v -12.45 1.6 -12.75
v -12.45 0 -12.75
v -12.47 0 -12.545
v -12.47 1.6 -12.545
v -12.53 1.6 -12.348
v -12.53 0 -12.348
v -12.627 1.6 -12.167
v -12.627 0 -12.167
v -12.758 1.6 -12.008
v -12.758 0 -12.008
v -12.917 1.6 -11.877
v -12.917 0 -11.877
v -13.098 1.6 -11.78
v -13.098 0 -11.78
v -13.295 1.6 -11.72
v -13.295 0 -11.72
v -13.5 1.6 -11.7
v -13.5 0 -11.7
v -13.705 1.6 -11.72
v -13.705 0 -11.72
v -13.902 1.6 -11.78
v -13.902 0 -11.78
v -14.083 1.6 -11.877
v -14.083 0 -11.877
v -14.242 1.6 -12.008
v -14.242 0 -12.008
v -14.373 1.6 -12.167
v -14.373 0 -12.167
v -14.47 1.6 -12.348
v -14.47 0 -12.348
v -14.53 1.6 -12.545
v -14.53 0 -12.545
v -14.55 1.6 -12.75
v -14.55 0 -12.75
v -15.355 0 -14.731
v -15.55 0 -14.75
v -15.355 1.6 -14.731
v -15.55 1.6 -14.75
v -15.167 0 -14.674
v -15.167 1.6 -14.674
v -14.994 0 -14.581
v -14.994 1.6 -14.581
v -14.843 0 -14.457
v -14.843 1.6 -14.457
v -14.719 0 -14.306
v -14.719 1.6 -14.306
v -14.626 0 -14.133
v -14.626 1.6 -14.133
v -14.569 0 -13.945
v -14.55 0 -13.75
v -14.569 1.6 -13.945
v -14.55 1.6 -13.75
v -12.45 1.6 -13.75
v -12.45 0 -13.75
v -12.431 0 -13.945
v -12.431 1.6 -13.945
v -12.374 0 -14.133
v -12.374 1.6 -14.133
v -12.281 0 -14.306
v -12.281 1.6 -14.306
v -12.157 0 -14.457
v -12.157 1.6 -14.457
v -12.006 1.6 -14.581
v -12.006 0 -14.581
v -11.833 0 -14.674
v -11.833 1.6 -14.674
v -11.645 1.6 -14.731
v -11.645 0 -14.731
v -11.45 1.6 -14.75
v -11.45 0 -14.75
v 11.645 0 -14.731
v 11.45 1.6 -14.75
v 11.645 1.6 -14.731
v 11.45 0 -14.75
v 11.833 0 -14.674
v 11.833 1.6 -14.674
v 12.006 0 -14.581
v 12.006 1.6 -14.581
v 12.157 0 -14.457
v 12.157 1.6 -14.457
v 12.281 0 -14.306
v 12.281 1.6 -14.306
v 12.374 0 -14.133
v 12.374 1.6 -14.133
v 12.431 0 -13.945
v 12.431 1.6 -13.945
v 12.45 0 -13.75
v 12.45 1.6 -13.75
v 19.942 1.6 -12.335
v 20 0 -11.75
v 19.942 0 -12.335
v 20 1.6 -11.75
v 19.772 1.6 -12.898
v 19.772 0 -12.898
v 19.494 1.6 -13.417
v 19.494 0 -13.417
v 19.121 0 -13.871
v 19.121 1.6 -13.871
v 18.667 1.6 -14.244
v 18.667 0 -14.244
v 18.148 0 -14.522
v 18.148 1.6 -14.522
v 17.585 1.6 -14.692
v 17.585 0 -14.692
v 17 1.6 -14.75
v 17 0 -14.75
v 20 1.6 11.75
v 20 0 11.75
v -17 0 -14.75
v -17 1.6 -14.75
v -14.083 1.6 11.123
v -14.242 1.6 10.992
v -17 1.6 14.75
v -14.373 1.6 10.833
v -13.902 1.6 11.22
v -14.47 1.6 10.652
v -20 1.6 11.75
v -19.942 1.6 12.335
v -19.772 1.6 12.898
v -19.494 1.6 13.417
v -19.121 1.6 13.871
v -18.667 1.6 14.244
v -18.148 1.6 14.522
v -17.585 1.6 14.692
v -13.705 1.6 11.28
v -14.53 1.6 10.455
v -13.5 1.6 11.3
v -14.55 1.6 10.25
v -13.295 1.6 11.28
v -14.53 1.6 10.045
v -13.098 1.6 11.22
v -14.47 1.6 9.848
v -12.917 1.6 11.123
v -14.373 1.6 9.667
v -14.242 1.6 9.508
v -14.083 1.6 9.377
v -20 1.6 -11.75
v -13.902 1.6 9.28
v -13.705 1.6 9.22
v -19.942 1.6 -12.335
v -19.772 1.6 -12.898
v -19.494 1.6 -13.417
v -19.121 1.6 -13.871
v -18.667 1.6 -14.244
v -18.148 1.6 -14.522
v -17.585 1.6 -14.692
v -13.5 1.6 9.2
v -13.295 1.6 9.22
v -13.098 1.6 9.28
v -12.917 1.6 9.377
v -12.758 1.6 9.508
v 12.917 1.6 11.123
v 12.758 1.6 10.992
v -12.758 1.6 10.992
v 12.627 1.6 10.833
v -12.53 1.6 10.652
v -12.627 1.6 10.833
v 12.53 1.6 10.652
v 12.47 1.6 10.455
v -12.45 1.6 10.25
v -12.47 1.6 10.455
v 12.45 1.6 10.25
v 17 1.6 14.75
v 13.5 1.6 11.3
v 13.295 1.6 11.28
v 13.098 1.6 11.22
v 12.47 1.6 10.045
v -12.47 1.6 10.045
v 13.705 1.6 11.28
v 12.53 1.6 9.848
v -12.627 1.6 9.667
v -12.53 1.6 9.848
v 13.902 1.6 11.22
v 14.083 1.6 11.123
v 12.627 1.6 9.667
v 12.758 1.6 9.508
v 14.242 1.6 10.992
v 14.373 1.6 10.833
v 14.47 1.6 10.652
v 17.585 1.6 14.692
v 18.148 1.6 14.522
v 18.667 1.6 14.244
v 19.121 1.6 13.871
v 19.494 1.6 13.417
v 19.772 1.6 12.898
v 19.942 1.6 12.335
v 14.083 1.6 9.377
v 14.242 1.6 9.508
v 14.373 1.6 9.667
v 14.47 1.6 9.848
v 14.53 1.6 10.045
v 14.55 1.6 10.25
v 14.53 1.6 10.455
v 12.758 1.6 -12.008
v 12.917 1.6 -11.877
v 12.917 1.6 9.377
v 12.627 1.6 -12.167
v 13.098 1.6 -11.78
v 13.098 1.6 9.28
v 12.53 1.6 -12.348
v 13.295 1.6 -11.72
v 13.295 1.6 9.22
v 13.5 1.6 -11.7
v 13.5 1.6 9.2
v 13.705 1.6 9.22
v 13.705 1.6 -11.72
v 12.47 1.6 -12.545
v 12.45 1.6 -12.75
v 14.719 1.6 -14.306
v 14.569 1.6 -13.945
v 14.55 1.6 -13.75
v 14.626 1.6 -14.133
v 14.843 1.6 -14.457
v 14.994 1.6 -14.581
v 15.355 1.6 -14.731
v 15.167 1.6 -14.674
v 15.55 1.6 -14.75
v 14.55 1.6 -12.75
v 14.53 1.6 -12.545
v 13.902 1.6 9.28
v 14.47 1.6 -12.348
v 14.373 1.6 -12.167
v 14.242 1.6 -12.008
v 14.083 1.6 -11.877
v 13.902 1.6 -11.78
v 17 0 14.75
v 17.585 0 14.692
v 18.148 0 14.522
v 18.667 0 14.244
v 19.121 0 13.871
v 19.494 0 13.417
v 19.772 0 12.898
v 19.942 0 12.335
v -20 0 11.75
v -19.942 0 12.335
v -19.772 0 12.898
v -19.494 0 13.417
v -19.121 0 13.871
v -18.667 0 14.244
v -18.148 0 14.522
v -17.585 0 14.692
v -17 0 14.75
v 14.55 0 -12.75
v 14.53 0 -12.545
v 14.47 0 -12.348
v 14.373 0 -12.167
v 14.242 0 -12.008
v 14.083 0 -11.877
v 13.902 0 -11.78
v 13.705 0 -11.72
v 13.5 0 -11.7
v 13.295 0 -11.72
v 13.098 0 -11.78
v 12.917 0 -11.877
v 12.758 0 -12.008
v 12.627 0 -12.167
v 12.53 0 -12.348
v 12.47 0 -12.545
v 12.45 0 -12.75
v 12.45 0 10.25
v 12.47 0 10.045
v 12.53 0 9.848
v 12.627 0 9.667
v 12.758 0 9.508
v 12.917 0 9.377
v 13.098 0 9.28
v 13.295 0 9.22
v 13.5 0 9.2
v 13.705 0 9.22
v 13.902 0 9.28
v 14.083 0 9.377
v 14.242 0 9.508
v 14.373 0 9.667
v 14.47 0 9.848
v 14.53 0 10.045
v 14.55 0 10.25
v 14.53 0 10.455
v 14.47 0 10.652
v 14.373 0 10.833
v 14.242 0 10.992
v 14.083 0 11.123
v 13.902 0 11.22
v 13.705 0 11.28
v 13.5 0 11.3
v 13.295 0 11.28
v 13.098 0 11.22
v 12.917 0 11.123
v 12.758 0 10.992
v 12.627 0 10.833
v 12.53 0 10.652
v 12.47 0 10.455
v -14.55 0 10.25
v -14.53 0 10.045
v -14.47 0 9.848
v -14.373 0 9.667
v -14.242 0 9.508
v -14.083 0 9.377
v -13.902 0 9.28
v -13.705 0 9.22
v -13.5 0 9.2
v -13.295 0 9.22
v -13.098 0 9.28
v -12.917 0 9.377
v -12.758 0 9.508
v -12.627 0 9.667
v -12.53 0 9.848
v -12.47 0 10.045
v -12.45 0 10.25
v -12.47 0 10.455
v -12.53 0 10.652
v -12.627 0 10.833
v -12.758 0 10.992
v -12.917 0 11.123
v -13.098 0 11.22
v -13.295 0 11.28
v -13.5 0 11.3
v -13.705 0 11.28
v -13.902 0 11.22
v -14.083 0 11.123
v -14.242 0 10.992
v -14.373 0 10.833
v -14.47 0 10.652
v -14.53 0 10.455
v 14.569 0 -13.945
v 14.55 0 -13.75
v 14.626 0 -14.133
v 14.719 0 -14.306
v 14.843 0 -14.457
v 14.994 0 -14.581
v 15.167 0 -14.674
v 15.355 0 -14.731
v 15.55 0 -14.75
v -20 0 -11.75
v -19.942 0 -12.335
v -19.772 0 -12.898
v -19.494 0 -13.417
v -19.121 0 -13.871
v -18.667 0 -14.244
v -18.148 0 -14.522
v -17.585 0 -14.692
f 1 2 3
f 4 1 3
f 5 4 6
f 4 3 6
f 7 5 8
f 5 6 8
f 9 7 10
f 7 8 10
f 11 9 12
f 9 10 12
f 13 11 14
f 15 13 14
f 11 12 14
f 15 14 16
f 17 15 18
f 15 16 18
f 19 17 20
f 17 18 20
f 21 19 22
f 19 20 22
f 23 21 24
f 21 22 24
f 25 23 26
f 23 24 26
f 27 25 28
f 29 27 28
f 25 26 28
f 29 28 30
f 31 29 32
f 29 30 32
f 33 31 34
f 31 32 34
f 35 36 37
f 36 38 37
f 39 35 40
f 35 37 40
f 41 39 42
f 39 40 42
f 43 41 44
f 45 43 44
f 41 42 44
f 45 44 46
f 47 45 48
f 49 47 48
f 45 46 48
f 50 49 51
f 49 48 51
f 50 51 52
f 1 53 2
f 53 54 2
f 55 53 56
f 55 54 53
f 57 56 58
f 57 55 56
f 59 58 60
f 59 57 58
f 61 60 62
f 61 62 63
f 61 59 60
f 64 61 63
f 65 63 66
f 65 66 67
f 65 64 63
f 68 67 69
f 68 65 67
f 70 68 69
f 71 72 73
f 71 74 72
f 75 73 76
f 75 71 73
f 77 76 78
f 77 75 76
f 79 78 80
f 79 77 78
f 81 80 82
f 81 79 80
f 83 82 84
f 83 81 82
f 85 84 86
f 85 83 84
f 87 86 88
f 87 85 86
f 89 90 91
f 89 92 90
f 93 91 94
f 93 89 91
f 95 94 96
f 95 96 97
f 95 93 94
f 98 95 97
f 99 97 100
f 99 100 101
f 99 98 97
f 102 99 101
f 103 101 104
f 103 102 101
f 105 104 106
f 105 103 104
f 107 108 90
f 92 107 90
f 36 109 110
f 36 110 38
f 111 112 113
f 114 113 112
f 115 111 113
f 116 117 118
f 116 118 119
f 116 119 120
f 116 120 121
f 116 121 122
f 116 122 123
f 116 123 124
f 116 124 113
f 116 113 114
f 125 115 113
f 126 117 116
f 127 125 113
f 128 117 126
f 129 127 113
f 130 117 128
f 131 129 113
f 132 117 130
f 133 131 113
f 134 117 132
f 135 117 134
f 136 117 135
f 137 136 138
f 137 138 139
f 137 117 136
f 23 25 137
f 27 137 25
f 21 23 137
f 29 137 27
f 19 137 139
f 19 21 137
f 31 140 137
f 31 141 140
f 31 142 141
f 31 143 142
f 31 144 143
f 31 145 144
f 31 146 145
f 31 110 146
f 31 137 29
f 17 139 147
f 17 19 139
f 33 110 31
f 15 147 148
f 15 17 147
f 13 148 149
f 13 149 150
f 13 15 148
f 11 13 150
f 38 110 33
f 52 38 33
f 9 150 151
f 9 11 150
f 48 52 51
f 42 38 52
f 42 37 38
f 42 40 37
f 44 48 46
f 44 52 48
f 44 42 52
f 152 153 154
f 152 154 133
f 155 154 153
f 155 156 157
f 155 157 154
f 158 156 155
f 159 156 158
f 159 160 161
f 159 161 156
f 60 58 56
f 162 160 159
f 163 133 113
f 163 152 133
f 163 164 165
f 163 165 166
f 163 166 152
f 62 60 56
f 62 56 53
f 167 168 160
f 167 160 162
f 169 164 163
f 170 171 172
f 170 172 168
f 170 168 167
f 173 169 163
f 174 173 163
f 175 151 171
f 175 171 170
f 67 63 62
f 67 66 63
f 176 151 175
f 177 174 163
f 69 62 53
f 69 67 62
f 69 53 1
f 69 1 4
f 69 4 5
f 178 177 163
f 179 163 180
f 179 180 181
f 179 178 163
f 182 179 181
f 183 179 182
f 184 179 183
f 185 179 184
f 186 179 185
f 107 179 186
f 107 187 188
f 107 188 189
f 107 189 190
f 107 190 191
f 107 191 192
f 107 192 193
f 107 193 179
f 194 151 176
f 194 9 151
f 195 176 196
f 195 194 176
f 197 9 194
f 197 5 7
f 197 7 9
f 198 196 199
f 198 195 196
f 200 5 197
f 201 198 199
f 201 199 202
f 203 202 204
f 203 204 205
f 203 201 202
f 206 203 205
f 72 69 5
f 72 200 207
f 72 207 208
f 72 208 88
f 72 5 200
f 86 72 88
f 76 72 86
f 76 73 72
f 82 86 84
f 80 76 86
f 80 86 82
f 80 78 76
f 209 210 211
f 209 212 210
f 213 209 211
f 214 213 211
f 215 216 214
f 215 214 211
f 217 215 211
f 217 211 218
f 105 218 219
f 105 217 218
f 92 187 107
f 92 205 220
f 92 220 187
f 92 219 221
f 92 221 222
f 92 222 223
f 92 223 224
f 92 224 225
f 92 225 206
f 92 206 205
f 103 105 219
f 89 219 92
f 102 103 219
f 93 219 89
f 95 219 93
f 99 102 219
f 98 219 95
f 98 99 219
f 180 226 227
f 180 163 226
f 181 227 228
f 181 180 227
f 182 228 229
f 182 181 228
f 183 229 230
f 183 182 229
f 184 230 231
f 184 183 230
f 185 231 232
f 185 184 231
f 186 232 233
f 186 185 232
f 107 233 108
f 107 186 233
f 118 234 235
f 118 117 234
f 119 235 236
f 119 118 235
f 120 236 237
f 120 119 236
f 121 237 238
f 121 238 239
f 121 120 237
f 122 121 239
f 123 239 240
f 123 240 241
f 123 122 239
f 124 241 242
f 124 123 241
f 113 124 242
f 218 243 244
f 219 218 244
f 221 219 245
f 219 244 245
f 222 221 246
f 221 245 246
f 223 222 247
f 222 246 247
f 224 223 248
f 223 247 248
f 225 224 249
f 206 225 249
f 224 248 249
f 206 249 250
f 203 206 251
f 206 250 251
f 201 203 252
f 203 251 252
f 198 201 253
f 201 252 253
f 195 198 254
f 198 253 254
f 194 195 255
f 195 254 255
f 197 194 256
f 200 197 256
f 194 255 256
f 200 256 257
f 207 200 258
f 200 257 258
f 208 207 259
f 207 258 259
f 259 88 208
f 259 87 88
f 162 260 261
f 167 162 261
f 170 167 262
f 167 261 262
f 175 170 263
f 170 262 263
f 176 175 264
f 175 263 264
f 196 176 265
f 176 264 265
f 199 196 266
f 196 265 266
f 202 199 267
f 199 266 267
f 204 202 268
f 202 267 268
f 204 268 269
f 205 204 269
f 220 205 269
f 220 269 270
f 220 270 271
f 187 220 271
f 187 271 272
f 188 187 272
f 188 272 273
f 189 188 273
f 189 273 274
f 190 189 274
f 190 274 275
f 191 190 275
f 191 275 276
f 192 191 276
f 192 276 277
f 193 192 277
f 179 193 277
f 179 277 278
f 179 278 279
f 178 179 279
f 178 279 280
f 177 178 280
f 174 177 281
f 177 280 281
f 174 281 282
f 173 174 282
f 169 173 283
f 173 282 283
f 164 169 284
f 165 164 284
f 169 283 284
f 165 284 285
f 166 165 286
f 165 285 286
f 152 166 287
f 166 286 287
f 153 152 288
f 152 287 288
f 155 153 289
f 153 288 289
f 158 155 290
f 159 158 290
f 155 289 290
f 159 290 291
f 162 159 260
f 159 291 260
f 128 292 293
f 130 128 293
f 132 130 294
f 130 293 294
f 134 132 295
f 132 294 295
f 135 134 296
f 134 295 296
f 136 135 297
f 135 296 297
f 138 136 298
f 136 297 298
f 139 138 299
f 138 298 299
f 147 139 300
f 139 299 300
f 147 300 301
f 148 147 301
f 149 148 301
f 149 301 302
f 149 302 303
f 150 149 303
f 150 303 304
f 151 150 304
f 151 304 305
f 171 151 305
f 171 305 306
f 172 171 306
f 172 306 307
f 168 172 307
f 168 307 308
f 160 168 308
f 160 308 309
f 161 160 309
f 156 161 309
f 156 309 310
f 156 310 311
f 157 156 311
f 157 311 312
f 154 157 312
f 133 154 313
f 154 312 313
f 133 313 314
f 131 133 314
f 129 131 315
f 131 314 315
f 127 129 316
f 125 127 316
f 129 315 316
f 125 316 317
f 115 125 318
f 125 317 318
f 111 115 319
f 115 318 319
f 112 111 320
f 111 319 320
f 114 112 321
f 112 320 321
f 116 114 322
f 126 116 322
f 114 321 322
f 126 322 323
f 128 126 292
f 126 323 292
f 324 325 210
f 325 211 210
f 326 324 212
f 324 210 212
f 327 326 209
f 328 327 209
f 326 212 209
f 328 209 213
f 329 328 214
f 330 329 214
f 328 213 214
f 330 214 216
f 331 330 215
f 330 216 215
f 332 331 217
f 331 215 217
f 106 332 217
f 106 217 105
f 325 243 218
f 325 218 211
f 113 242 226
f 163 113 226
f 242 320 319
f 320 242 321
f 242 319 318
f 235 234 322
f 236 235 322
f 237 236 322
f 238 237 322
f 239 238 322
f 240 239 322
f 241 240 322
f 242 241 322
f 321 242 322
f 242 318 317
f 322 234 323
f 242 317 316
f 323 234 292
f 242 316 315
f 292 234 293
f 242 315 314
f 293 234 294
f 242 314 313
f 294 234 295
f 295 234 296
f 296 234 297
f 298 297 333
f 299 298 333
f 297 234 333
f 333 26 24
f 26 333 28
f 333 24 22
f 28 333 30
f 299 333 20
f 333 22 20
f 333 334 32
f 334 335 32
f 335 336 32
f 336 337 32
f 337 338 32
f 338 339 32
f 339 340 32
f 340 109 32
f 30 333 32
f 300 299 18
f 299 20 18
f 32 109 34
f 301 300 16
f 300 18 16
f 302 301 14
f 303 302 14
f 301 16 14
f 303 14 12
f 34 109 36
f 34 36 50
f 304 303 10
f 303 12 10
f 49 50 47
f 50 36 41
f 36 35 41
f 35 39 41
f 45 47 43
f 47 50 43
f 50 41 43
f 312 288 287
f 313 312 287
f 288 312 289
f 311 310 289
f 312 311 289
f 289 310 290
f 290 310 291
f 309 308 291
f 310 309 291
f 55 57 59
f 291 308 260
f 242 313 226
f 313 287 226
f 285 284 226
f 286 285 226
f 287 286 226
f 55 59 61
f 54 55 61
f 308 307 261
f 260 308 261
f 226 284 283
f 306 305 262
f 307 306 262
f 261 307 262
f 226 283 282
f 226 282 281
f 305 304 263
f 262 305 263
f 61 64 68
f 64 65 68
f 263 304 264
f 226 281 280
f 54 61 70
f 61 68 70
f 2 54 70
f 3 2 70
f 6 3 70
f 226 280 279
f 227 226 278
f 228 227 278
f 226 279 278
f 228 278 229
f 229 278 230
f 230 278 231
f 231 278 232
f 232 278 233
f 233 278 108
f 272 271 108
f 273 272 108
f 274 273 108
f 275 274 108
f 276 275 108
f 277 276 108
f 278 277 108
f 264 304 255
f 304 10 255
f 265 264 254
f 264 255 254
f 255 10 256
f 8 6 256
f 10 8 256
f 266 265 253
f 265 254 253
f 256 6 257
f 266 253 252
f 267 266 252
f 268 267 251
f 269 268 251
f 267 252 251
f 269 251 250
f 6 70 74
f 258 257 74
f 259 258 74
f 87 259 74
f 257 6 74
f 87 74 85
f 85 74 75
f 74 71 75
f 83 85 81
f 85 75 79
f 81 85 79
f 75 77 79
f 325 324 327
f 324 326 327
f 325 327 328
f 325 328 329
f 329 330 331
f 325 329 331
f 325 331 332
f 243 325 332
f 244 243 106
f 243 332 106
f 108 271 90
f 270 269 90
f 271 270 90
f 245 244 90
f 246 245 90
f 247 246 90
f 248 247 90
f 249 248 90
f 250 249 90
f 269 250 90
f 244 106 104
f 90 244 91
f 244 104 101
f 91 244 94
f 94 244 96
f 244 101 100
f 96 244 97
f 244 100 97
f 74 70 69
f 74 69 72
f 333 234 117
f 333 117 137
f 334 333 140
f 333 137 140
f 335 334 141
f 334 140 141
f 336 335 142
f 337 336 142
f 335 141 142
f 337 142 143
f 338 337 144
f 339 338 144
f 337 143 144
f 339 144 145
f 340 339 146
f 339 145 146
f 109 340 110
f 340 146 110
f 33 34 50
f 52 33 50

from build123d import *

# Parameters (mm, degrees)
SKETCH1_W                = 40
SKETCH1_H                = 29.5
BOSS_EXTRUDE1_DEPTH      = 1.6
FILLET1_R                = 3
M2_CLEARANCE_HOLE3_D     = 2.1
M2_CLEARANCE_HOLE3_DEPTH = 5.2
M2_CLEARANCE_HOLE3_TIP   = 0.63090365
CUT_EXTRUDE2_DEPTH       = 25.902258934
CUT_EXTRUDE2_DEPTH_BACK  = 25.902258934
FILLET3_R                = 1


with BuildPart() as part:
    # Sketch1 → Boss-Extrude1 (new body)
    with BuildSketch(Plane(origin=(0, 0, 0), x_dir=(1, 0, 0), z_dir=(0, 1, 0))):
        Rectangle(SKETCH1_W, SKETCH1_H)
    extrude(amount=BOSS_EXTRUDE1_DEPTH)

    # Fillet1
    fillet1_edges = [part.edges().sort_by_distance(p)[0] for p in [
        (-20, 0.8, -14.75),
        (20, 0.8, -14.75),
        (20, 0.8, 14.75),
        (-20, 0.8, 14.75),
    ]]
    fillet(fillet1_edges, radius=FILLET1_R)

    # M2 Clearance Hole3
    with Locations(Plane(origin=(0, 1.6, 0), x_dir=(1, 0, 0), z_dir=(0, 1, 0))):
        with Locations((-13.5, 12.75), (13.5, 12.75), (13.5, -10.25), (-13.5, -10.25)):
            Hole(M2_CLEARANCE_HOLE3_D / 2, depth=M2_CLEARANCE_HOLE3_DEPTH)
            with Locations((0, 0, -(M2_CLEARANCE_HOLE3_DEPTH + M2_CLEARANCE_HOLE3_TIP / 2))):  # 118° drill point
                Cone(0, M2_CLEARANCE_HOLE3_D / 2, M2_CLEARANCE_HOLE3_TIP, mode=Mode.SUBTRACT)

    # Sketch10 → Cut-Extrude2 (cut, two sides: drawn at the far end of the back side and taken through both)
    with BuildSketch(Plane(origin=(0, 1.6, 0), x_dir=(1, 0, 0), z_dir=(0, 1, 0)).offset(-CUT_EXTRUDE2_DEPTH_BACK)):
        with BuildLine():
            Line((-14.55, 12.75), (-14.55, 17.75))
            ThreePointArc((-14.55, 17.75), (-13.5, 18.8), (-12.45, 17.75))
            Line((-12.45, 17.75), (-12.45, 12.75))
            ThreePointArc((-12.45, 12.75), (-13.5, 11.7), (-14.55, 12.75))
        make_face()
        with BuildLine():
            Line((14.55, 12.75), (14.55, 17.75))
            ThreePointArc((14.55, 17.75), (13.5, 18.8), (12.45, 17.75))
            Line((12.45, 17.75), (12.45, 12.75))
            ThreePointArc((12.45, 12.75), (13.5, 11.7), (14.55, 12.75))
        make_face()
    extrude(amount=CUT_EXTRUDE2_DEPTH + CUT_EXTRUDE2_DEPTH_BACK, mode=Mode.SUBTRACT)

    # Fillet3
    fillet3_edges = [part.edges().sort_by_distance(p)[0] for p in [
        (-14.55, 0.8, -14.75),
        (-12.45, 0.8, -14.75),
        (12.45, 0.8, -14.75),
        (14.55, 0.8, -14.75),
    ]]
    fillet(fillet3_edges, radius=FILLET3_R)


solid = part.part
